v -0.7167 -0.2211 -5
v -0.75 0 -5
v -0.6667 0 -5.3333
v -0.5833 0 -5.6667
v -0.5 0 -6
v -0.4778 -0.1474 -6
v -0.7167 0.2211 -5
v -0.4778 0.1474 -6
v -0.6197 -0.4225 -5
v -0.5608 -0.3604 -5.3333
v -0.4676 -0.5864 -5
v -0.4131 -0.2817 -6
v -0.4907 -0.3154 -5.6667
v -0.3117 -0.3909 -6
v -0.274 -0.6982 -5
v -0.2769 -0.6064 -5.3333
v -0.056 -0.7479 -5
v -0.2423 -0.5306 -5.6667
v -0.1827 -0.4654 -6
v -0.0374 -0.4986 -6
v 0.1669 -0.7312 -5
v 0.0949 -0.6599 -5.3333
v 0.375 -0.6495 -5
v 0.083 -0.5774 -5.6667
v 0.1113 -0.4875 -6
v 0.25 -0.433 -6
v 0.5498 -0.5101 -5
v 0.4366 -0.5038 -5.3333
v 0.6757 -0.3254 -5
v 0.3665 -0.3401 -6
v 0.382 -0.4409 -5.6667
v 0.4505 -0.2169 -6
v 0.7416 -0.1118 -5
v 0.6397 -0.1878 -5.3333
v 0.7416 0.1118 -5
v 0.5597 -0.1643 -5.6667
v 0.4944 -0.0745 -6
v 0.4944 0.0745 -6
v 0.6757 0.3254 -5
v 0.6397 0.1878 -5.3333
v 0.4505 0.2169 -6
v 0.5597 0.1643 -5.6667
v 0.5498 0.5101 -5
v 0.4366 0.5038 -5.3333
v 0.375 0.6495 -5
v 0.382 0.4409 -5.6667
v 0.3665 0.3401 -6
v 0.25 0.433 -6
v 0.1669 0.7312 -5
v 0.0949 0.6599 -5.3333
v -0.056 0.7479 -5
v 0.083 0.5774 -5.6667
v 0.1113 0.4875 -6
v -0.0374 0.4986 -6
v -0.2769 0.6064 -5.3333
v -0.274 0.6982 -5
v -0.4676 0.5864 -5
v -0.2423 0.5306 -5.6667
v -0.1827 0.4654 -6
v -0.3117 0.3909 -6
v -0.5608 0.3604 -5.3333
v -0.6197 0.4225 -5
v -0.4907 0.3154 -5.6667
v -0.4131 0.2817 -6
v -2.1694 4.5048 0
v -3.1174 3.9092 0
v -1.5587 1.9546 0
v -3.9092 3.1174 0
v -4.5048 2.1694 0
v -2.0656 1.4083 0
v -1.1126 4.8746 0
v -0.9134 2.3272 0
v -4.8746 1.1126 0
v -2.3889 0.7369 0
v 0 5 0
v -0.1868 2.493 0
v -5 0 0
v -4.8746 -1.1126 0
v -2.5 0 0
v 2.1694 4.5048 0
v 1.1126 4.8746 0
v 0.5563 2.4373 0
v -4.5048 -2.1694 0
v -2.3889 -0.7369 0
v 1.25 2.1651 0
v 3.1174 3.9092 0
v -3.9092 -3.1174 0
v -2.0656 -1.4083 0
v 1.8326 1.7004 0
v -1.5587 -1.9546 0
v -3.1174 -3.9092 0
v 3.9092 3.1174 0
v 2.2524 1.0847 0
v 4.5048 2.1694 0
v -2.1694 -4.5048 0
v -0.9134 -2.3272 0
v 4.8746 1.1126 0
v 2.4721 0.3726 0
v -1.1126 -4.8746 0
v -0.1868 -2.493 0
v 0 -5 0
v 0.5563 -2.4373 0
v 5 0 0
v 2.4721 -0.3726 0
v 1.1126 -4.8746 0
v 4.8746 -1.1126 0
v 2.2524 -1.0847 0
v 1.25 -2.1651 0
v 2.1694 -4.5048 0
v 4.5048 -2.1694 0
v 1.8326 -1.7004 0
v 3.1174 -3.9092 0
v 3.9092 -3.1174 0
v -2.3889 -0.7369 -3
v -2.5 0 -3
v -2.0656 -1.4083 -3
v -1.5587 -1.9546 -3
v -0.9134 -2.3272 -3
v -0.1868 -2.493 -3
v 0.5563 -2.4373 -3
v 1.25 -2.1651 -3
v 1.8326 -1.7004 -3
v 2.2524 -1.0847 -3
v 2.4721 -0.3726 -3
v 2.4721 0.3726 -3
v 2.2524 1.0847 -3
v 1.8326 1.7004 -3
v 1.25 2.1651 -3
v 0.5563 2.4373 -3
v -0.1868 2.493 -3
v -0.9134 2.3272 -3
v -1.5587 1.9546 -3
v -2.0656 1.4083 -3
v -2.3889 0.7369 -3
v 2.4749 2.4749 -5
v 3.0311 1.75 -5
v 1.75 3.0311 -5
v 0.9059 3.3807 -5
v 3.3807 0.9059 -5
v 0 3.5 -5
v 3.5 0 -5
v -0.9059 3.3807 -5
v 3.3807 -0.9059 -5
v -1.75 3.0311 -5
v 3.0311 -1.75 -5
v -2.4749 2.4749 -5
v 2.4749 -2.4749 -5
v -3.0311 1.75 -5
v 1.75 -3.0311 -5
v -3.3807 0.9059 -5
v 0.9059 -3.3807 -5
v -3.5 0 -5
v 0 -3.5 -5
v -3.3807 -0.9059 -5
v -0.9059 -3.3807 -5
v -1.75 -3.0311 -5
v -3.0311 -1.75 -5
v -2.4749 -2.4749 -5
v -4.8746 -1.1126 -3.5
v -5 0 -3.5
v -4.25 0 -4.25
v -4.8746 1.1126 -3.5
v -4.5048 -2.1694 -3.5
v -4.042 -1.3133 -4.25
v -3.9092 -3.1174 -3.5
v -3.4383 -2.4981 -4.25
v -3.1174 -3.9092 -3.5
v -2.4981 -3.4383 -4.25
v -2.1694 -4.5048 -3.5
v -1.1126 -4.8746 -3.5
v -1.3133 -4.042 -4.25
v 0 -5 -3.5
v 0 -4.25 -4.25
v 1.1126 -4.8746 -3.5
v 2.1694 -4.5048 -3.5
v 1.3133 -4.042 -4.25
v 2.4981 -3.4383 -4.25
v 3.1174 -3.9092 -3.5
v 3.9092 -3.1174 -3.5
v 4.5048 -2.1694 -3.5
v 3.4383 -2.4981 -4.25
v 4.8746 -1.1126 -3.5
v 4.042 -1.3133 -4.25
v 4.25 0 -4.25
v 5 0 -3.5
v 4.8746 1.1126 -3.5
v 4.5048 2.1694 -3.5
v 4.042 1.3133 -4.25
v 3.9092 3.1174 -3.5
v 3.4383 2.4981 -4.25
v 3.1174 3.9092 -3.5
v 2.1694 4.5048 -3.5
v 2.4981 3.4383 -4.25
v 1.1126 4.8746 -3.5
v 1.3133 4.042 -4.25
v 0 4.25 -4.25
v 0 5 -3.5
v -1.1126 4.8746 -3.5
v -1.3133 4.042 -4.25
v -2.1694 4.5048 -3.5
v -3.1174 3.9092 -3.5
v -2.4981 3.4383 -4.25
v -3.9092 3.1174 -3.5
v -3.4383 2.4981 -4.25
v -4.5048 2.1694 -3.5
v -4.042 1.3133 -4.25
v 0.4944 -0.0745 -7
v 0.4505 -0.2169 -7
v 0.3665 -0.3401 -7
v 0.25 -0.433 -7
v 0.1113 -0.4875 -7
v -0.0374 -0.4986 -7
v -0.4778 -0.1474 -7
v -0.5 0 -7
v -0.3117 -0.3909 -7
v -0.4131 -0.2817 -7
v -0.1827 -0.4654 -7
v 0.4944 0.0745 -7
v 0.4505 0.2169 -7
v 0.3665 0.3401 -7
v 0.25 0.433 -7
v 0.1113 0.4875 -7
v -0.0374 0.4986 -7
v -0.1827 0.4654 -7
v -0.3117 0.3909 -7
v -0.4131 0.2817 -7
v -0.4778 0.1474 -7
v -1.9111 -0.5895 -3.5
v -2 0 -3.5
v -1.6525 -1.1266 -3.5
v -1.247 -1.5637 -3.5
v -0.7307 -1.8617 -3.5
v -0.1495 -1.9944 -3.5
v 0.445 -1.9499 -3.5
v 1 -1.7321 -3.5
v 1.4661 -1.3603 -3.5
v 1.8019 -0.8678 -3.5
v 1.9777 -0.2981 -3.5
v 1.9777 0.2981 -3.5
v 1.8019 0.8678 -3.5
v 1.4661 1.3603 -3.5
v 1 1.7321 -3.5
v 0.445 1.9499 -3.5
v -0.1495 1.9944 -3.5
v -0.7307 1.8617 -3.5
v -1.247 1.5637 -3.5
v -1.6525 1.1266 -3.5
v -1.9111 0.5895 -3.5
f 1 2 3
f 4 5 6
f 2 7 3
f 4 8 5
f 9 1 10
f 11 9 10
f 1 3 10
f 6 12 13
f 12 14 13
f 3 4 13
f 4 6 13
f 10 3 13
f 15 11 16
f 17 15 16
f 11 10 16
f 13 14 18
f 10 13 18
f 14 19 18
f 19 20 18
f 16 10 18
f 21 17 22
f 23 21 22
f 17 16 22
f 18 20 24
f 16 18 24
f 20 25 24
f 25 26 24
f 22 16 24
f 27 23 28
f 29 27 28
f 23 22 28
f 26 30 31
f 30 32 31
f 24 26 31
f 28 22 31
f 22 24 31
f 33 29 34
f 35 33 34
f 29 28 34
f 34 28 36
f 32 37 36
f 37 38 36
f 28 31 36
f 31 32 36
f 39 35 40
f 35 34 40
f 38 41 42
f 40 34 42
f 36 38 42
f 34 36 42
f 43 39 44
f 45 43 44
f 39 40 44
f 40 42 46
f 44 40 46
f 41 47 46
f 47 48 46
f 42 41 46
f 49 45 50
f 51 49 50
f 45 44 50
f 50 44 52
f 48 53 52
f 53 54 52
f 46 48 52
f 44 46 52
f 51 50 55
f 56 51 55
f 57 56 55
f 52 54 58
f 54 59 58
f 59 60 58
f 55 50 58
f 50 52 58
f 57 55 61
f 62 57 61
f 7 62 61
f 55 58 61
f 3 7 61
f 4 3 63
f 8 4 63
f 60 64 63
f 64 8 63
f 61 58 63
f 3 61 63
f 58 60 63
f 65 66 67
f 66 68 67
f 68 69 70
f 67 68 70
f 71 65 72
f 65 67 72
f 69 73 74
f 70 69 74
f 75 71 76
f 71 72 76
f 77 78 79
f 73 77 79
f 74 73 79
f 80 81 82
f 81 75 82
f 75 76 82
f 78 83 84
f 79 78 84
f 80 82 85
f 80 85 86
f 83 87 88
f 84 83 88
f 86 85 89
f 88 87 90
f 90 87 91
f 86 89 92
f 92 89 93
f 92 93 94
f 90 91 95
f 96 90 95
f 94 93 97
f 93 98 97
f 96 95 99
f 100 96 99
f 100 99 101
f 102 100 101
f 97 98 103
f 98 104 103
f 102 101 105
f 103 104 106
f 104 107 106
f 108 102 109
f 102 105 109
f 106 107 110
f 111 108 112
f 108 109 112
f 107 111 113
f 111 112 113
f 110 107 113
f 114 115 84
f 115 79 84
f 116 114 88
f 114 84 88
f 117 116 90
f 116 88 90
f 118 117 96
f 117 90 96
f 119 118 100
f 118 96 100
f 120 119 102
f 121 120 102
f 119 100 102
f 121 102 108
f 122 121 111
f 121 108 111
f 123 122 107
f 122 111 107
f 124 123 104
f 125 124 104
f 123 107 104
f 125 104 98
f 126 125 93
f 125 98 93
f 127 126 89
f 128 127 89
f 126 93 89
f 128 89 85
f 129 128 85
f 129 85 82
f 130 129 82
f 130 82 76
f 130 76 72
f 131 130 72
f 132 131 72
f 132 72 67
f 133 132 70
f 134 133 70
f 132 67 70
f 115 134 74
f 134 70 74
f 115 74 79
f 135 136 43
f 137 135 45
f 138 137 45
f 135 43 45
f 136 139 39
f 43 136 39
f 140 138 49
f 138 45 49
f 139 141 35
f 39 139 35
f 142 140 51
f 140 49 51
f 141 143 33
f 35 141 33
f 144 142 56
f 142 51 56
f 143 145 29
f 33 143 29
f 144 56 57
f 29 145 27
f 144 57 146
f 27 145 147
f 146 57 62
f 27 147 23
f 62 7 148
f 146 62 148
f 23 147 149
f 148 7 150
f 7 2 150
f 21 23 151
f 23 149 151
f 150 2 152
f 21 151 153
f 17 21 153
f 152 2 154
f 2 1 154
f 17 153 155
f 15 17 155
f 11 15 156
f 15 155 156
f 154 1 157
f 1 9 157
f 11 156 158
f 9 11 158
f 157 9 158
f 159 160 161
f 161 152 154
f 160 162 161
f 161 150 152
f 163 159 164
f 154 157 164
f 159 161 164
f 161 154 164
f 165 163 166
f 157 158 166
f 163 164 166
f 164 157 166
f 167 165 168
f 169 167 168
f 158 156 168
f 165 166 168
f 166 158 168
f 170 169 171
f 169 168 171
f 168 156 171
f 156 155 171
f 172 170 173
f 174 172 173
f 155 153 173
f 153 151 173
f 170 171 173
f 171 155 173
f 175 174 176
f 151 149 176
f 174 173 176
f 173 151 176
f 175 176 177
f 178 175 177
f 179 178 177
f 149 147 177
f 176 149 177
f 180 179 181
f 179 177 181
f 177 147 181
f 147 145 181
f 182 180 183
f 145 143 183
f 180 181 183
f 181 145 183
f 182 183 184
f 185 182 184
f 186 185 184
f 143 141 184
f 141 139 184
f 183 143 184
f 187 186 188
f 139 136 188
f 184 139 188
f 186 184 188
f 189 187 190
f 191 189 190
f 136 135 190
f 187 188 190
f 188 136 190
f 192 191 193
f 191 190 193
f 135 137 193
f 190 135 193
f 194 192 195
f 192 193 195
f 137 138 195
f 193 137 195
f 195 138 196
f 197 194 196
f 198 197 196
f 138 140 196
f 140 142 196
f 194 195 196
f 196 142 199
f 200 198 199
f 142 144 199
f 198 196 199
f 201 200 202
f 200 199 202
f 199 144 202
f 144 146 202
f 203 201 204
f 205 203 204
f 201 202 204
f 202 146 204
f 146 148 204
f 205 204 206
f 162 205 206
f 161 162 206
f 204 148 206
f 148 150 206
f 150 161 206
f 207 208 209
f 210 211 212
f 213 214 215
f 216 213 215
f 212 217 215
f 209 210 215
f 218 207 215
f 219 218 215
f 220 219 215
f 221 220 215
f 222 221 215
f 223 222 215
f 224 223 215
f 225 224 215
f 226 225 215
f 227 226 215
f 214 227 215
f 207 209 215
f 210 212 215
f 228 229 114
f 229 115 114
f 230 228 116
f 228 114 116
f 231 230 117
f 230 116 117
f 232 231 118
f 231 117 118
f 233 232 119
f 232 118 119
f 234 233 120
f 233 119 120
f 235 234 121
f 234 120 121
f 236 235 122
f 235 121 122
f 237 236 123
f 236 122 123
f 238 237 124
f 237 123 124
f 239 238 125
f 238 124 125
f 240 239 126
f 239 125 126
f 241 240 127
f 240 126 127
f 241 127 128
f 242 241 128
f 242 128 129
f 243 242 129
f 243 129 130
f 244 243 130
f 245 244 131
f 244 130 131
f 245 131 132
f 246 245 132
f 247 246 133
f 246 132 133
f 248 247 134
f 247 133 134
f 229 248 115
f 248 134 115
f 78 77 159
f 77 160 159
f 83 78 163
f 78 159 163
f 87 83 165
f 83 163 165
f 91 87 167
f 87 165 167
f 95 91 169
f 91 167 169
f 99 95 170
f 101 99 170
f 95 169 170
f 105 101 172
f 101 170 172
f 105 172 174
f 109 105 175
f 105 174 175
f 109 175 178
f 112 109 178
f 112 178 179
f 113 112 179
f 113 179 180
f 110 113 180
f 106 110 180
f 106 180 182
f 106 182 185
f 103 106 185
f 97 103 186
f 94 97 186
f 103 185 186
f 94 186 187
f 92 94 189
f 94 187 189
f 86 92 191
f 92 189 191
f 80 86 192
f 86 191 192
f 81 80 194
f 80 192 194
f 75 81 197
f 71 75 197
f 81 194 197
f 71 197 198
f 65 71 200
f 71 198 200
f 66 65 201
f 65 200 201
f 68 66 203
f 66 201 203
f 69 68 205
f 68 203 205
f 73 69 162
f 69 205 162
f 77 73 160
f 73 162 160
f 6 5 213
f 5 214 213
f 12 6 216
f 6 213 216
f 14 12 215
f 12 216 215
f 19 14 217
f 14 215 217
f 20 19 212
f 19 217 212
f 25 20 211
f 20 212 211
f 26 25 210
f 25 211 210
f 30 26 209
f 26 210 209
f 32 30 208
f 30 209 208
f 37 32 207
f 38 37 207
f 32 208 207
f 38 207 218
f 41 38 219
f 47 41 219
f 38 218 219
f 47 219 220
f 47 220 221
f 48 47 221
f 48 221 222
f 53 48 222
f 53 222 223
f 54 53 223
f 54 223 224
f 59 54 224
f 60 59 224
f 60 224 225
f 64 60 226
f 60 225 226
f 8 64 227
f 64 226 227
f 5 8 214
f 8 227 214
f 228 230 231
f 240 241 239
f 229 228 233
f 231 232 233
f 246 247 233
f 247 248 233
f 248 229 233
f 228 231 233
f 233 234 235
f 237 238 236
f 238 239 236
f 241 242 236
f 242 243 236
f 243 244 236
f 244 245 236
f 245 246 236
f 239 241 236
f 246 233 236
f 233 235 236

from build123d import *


with BuildPart() as part:
    # Sketch → Revolution (revolve)
    with BuildSketch(Plane.XZ):
        Polygon((-2.5, 0), (-5, 0), (-5, -3.5), (-3.5, -5), (-0.75, -5), (-0.5, -6), (-0.5, -7), (0, -7), (0, -3.5), (-2, -3.5), (-2.5, -3), align=None)
    revolve(axis=Axis((0, 0, 0), (0, 0, 1)))


solid = part.part
